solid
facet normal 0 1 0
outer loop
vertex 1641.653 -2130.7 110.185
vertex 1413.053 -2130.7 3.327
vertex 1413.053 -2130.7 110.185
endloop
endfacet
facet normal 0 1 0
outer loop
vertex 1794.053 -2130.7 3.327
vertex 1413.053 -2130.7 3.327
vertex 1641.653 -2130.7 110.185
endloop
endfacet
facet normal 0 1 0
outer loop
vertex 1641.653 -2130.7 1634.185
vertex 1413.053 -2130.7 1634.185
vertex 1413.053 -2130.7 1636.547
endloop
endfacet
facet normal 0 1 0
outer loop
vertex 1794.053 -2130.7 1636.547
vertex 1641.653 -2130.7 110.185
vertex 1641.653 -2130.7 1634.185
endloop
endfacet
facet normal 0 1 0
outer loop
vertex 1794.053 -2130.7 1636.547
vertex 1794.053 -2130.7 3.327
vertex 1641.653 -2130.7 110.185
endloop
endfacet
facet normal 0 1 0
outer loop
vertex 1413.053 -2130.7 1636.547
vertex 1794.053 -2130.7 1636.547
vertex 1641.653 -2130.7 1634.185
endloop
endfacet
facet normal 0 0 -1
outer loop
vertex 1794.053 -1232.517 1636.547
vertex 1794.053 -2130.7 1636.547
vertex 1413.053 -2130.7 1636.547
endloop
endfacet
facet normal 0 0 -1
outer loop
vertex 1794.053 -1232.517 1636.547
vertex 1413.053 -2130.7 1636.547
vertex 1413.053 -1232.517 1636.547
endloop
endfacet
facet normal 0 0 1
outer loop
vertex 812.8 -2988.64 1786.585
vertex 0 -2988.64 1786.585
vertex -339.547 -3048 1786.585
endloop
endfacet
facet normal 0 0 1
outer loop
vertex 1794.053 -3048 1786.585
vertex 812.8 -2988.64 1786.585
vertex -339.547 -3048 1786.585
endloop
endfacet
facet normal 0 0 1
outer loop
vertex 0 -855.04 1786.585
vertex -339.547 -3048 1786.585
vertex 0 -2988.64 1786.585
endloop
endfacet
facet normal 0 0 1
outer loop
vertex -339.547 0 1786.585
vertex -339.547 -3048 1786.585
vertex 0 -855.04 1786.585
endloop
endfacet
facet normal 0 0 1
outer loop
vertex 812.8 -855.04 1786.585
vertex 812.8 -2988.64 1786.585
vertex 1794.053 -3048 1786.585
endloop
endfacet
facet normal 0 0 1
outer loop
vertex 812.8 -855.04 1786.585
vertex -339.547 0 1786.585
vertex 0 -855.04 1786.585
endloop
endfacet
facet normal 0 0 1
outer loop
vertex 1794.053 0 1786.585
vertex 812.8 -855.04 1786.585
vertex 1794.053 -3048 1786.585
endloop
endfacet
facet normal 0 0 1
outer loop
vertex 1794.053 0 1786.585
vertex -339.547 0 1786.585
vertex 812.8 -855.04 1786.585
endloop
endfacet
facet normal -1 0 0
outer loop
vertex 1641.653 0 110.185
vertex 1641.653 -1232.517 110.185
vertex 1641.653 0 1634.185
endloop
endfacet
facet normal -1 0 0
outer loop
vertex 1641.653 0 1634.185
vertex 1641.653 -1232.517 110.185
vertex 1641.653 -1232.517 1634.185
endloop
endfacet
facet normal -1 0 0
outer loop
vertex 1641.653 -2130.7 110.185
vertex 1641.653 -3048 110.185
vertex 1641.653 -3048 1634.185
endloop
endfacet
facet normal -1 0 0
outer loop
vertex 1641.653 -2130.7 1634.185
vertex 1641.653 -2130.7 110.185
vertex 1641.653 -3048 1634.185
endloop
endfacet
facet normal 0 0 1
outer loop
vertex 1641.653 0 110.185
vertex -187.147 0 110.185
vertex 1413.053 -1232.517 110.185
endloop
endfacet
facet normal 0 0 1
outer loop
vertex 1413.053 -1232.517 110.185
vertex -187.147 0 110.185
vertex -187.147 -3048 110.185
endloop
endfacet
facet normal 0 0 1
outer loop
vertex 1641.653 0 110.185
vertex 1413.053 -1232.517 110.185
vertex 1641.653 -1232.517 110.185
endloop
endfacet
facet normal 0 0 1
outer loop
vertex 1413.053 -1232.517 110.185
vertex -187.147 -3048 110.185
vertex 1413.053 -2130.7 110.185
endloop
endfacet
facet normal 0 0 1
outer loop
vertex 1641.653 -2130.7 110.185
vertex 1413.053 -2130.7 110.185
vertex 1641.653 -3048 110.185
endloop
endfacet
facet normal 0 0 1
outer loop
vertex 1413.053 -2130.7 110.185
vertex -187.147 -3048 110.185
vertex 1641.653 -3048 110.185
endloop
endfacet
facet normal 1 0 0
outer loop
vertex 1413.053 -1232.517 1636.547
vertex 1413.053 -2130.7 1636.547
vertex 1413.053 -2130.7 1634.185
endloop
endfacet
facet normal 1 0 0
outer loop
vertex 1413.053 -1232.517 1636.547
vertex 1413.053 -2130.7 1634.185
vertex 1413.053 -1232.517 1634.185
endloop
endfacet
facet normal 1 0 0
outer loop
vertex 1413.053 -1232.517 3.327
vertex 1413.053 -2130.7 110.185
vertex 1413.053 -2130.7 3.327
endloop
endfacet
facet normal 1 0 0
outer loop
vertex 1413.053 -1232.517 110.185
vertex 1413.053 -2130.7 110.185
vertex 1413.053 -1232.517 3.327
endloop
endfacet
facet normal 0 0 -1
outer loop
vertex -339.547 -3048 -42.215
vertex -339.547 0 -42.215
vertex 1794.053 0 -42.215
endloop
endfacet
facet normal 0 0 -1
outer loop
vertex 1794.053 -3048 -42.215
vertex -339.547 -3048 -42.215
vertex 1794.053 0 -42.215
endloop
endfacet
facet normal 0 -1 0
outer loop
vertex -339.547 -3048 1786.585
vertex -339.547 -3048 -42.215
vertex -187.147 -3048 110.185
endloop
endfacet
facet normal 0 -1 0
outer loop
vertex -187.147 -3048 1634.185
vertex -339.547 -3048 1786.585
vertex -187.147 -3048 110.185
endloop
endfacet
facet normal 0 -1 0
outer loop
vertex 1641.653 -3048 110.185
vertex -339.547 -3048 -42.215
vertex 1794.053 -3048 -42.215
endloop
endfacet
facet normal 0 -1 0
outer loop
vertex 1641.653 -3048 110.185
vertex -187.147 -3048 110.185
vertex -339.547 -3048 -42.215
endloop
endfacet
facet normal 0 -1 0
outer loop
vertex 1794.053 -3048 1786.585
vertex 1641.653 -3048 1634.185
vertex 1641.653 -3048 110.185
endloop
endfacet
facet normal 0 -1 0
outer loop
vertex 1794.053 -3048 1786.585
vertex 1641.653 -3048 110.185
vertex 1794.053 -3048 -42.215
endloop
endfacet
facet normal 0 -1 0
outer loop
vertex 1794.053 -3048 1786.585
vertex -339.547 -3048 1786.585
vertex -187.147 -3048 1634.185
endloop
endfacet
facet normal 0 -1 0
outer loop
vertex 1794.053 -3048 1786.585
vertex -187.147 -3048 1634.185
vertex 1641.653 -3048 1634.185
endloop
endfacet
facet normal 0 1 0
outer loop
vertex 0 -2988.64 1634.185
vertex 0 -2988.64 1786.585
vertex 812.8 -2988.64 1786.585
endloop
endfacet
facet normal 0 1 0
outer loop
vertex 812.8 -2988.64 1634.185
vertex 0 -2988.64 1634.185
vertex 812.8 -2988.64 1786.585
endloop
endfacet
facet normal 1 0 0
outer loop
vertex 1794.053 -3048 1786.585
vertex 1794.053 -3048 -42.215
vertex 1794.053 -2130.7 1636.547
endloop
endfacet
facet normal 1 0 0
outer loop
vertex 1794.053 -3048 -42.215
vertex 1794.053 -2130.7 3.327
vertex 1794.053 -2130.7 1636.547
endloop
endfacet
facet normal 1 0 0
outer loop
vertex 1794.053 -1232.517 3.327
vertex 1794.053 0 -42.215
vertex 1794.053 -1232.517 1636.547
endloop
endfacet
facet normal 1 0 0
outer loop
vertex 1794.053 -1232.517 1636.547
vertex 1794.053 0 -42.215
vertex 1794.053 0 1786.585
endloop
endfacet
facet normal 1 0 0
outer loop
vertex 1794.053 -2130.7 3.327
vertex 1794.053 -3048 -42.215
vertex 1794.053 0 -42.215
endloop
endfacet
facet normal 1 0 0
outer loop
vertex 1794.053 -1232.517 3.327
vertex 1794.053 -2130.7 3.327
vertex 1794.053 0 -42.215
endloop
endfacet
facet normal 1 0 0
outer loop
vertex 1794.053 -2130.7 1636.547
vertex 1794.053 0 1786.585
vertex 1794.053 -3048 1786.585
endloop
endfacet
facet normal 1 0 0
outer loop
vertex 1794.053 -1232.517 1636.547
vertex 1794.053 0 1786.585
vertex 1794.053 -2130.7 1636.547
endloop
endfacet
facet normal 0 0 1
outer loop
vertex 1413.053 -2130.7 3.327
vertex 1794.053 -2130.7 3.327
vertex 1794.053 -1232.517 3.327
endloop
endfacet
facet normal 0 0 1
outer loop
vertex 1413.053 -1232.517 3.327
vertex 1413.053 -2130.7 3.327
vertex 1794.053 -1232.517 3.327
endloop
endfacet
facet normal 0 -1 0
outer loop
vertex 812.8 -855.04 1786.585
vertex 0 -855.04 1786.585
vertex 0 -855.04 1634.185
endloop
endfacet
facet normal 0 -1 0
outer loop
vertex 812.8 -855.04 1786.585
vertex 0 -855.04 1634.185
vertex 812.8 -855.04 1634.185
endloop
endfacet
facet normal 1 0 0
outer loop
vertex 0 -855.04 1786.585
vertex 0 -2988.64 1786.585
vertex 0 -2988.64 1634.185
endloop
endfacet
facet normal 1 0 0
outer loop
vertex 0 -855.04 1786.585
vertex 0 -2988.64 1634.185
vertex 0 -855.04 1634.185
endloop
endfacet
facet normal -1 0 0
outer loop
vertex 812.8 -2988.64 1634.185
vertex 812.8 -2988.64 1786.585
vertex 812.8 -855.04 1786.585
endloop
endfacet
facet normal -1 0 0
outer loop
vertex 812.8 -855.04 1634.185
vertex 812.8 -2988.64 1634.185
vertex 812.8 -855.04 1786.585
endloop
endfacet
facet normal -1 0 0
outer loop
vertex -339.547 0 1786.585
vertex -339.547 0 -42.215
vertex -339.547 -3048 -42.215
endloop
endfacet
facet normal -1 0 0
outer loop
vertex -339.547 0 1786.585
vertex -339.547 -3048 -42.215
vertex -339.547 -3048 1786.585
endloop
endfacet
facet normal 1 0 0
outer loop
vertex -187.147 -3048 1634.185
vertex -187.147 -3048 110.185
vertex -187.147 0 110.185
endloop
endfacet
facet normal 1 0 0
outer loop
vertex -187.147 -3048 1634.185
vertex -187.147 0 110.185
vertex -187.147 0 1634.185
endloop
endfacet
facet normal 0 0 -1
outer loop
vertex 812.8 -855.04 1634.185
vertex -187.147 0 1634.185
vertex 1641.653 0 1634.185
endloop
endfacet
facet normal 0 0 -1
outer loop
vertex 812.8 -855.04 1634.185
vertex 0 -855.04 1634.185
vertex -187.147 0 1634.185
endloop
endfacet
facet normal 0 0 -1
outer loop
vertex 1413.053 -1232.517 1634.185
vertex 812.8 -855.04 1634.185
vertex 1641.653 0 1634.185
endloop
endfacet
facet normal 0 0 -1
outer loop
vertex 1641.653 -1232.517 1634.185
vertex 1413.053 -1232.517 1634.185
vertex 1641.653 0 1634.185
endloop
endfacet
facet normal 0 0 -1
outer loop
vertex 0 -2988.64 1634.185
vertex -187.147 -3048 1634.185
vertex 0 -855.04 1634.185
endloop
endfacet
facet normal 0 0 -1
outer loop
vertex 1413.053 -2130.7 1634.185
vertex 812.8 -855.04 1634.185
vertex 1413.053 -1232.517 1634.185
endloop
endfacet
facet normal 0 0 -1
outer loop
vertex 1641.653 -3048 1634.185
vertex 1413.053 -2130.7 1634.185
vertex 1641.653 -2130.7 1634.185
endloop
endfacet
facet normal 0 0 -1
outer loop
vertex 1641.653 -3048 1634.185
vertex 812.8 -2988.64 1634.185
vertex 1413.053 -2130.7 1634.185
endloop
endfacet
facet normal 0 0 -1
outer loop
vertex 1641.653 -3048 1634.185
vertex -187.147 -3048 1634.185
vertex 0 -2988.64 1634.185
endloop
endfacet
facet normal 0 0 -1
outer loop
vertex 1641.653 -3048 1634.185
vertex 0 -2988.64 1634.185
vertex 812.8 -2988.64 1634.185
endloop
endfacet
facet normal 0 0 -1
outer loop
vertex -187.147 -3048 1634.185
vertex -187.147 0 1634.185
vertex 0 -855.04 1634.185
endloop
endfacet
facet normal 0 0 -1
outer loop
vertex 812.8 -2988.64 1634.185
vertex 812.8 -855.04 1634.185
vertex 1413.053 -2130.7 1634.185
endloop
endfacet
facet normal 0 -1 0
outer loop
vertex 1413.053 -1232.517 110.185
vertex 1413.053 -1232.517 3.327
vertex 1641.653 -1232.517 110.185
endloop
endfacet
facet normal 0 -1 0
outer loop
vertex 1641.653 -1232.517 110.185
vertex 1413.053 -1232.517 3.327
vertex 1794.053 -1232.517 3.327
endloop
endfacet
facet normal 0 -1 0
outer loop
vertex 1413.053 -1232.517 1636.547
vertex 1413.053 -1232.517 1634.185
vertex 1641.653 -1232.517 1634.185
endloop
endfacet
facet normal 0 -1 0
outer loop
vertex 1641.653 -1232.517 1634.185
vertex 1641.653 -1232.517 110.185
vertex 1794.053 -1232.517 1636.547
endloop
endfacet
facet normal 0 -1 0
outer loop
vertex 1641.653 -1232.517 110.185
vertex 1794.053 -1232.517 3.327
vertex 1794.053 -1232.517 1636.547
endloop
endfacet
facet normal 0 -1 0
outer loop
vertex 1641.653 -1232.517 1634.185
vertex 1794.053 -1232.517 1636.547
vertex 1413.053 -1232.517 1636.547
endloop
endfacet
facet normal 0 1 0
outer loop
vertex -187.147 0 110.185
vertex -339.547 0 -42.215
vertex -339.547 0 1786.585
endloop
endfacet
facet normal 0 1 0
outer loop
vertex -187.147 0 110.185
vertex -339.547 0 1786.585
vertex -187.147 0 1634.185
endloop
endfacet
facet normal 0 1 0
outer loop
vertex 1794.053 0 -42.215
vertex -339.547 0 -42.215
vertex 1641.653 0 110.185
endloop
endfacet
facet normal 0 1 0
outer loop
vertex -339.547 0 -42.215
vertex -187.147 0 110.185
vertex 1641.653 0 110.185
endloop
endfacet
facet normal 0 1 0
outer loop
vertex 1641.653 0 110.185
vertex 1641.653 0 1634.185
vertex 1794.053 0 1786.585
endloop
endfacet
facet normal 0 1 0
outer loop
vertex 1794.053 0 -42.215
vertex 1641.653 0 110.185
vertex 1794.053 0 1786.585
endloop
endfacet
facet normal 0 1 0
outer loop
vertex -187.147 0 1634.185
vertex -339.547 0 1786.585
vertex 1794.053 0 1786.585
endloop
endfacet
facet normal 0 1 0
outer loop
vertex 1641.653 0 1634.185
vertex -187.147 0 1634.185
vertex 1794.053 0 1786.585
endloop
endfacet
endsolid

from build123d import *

# Parameters (mm, degrees)
F0_W     = 2133.6
F0_H     = 1828.8
F1_DEPTH = 3048
F2_W     = 1828.8
F2_H     = 1524
F3_DEPTH = 3302
F4_W     = 812.8
F4_H     = 2133.6
F5_DEPTH = 304.8
F6_W     = 898.183346
F6_H     = 1633.220315
F7_DEPTH = 381


with BuildPart() as f1:
    # F0 (on Front) → F1 (new body)
    with BuildSketch(Plane.XZ):
        with Locations((727.252798, 872.185197)):
            Rectangle(F0_W, F0_H)
    extrude(amount=F1_DEPTH)

    # F2 (on face) → F3 (cut)
    with BuildSketch(Plane.XZ.offset(3048)):
        with Locations((727.252798, 872.185197)):
            Rectangle(F2_W, F2_H)
    extrude(amount=-F3_DEPTH, mode=Mode.SUBTRACT)

    # F4 (on face) → F5 (cut)
    with BuildSketch(Plane.XY.offset(1786.585197)):
        with Locations((406.4, -1921.840308)):
            Rectangle(F4_W, F4_H)
    extrude(amount=-F5_DEPTH, mode=Mode.SUBTRACT)

    # F6 (on face) → F7 (cut)
    with BuildSketch(Plane.YZ.offset(1794.052798)):
        with Locations((-1681.6082, 819.937289)):
            Rectangle(F6_W, F6_H)
    extrude(amount=-F7_DEPTH, mode=Mode.SUBTRACT)


solid = f1.part
